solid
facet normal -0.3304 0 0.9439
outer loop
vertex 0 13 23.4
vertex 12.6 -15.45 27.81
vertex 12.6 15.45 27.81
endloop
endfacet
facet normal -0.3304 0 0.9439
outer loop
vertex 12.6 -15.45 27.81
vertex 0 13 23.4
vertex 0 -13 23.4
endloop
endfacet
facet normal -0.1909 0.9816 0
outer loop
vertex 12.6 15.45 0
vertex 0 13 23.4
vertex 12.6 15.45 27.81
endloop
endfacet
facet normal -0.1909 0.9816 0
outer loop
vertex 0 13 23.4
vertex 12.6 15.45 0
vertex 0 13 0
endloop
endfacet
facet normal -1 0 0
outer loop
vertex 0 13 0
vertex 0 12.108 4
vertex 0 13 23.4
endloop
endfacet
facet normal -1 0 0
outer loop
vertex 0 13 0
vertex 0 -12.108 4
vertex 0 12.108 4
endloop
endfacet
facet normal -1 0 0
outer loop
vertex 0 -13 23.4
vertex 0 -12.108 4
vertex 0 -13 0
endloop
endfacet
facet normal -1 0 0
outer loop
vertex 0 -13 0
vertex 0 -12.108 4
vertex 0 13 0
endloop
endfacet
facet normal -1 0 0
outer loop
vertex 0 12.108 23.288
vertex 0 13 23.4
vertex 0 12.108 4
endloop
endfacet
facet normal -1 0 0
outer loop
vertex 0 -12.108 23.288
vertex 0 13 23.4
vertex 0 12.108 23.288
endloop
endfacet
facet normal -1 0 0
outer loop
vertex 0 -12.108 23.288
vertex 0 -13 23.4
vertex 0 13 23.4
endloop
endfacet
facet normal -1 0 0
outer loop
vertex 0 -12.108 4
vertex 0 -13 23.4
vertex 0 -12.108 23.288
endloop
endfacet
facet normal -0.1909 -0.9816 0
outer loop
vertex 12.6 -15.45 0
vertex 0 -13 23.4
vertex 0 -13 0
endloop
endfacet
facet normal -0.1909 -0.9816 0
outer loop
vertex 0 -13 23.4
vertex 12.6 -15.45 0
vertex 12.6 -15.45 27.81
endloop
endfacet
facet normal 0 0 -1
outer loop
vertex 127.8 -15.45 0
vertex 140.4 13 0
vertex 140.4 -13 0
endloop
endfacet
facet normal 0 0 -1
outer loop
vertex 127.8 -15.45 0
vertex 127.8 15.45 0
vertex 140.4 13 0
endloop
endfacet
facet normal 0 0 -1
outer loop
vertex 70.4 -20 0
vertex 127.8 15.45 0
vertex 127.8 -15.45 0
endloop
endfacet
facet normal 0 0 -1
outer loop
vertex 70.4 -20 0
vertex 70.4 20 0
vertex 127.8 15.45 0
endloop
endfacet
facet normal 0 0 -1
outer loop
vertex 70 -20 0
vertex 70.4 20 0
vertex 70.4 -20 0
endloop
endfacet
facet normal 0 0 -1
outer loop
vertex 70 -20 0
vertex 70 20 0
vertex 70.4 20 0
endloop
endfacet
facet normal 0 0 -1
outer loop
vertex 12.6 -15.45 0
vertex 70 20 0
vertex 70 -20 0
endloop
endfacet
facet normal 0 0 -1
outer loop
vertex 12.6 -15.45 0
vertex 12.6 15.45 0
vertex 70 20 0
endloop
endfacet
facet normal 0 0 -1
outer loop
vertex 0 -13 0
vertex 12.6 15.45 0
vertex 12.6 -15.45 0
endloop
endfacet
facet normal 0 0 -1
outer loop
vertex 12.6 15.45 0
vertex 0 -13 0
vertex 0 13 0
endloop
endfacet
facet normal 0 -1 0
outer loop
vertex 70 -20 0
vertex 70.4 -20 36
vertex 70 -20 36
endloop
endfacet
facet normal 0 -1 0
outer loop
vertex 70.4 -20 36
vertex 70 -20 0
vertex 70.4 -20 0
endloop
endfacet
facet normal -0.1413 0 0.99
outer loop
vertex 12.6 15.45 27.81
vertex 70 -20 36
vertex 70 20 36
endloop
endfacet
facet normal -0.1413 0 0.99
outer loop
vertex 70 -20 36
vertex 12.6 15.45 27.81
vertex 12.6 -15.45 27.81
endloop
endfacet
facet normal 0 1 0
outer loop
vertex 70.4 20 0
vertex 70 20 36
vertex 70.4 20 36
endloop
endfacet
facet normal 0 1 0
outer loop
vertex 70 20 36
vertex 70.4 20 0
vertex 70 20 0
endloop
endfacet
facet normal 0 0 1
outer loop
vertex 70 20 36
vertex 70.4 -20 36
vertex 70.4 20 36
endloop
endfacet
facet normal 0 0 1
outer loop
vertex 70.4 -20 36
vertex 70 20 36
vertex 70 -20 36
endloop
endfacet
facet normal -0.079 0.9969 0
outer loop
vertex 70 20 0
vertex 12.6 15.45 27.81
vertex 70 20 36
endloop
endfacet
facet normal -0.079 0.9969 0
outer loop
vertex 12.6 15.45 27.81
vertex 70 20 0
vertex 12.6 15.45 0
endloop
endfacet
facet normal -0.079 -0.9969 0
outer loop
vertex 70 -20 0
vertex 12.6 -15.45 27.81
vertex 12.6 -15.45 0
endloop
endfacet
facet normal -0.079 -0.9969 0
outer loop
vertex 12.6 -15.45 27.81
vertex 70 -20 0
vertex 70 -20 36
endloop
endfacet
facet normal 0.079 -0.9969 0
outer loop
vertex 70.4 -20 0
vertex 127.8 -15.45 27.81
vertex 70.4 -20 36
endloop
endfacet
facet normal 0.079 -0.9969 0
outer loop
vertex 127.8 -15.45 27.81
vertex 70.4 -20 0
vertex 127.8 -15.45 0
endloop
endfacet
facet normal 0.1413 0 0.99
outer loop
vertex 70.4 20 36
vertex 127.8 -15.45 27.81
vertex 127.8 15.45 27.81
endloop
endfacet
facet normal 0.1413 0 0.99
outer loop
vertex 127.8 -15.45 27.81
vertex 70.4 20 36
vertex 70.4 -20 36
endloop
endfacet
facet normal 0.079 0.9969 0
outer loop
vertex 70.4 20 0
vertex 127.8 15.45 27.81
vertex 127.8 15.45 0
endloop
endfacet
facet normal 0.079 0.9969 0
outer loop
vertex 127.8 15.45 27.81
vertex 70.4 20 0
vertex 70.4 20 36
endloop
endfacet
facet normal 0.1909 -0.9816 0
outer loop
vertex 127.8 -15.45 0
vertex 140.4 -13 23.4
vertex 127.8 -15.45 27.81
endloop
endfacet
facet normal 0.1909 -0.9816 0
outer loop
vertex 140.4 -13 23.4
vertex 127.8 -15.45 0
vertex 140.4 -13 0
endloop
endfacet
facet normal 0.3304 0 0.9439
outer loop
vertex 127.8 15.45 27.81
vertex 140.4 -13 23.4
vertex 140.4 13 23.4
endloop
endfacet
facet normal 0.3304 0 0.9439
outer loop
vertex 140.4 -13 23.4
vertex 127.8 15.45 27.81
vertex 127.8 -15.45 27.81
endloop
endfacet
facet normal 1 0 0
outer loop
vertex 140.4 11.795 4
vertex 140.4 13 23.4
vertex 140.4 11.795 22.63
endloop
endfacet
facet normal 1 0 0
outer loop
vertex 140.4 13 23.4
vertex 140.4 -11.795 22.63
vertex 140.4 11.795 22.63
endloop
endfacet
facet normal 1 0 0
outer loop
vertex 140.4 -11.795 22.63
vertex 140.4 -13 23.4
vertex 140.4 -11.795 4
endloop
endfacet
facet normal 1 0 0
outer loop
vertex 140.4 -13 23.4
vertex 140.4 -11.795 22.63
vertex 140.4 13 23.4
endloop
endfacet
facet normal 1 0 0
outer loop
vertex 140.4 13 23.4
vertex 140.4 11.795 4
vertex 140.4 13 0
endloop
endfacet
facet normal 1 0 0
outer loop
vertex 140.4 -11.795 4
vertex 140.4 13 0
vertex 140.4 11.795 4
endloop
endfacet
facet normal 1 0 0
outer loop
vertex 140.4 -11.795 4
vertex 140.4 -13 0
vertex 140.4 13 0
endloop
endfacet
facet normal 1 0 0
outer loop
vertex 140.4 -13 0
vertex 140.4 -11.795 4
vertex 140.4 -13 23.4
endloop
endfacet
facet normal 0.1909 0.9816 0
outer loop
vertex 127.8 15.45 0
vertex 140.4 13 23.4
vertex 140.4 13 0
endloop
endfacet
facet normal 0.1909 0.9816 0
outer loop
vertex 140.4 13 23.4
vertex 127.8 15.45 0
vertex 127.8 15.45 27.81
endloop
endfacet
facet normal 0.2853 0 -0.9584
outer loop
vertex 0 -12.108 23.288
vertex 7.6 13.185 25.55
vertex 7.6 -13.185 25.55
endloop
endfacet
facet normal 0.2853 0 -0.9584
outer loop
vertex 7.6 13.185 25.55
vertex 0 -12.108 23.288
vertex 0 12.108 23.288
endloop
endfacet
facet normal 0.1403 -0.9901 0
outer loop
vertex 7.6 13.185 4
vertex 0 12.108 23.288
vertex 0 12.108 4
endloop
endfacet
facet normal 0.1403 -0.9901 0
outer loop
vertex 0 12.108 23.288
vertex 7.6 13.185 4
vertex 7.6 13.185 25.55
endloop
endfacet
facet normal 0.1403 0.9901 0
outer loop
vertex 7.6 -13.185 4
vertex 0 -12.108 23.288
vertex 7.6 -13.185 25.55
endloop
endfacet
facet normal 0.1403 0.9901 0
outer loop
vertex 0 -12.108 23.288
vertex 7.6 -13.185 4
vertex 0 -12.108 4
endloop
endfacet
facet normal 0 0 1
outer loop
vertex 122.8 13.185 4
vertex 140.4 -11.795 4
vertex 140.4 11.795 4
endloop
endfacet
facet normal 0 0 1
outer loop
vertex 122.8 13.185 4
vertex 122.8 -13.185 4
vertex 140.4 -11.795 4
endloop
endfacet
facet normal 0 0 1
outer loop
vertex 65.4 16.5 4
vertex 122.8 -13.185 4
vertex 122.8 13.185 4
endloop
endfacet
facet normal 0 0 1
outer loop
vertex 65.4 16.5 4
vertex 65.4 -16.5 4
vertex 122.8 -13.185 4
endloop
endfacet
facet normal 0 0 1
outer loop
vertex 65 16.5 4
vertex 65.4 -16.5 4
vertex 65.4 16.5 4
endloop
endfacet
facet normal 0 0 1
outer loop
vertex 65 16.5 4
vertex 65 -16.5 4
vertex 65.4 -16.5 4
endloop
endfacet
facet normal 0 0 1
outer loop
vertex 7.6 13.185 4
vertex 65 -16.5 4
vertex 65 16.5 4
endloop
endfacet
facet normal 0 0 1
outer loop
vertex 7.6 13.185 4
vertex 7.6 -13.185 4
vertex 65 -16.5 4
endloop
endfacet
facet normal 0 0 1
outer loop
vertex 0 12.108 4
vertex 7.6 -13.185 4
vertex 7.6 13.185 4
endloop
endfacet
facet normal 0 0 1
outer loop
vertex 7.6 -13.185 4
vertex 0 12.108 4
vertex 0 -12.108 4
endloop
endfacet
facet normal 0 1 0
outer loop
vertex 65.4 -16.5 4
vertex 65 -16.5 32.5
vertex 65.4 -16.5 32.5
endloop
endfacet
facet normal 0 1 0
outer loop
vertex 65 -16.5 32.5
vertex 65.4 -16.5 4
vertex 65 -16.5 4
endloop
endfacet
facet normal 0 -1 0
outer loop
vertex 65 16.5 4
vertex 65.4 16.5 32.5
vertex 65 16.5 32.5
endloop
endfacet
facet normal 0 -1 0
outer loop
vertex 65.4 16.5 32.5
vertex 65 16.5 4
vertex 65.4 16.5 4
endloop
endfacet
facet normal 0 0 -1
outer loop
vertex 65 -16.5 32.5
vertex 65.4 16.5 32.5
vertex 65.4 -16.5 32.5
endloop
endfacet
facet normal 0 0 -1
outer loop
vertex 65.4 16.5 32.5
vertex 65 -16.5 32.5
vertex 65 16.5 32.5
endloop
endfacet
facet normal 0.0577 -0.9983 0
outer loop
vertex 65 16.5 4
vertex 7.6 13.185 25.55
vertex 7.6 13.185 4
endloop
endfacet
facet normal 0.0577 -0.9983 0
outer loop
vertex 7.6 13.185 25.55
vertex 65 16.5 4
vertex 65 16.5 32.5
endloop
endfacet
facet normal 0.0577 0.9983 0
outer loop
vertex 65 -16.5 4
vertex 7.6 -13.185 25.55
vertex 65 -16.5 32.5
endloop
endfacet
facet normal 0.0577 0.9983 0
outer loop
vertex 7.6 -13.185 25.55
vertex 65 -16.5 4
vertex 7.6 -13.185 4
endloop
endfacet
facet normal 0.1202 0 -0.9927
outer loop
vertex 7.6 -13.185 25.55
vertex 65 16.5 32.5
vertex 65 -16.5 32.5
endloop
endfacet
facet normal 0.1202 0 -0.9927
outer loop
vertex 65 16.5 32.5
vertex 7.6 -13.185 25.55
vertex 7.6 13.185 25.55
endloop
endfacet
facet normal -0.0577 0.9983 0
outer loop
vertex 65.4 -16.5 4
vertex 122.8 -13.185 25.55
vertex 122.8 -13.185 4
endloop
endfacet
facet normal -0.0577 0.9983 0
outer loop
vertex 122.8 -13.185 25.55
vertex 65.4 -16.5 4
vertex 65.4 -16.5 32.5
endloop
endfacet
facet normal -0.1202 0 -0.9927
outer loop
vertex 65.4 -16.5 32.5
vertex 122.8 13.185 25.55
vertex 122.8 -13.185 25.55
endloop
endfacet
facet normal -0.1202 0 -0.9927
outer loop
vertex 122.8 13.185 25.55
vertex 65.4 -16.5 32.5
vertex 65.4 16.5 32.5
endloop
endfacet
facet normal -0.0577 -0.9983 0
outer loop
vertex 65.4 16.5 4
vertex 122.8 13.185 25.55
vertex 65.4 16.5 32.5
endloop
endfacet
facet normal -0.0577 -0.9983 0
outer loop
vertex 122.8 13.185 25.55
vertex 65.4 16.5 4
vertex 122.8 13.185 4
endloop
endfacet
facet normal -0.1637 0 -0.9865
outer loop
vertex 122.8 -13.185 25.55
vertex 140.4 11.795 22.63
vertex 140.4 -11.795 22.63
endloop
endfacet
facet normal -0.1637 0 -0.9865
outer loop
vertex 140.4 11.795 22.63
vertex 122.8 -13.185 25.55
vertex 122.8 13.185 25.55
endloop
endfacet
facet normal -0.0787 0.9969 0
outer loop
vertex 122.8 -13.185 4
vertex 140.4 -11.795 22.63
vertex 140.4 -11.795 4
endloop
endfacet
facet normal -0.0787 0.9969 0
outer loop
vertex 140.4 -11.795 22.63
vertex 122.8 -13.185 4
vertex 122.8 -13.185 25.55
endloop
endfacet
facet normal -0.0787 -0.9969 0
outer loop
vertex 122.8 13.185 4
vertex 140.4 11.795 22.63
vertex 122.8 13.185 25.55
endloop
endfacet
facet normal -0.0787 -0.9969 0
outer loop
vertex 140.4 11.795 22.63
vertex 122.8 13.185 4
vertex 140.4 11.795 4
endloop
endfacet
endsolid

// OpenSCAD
$fn = 32;

// ----------------------------------------------------------------------
// Faired channel: 140 x 40 x 36 mm, 3.5 mm walls, faired ends
// ----------------------------------------------------------------------

// --- parameters (mm) ---
length = 140;             // channel length
width = 40;               // channel width at mid length
height = 36;              // channel height at mid length
wall = 3.5;               // side wall thickness
floor_t = 4;              // floor thickness
end_w = 26;               // faired end width
end_h = 23.4;             // faired end height

difference() {
  union() {
    hull() {
      translate([0, -13, 0]) cube([0.4, 26, 23.4]);
      translate([12.6, -15.45, 0]) cube([0.4, 30.9, 27.81]);
    }
    hull() {
      translate([12.6, -15.45, 0]) cube([0.4, 30.9, 27.81]);
      translate([70, -20, 0]) cube([0.4, 40, 36]);
    }
    hull() {
      translate([70, -20, 0]) cube([0.4, 40, 36]);
      translate([127.4, -15.45, 0]) cube([0.4, 30.9, 27.81]);
    }
    hull() {
      translate([127.4, -15.45, 0]) cube([0.4, 30.9, 27.81]);
      translate([140, -13, 0]) cube([0.4, 26, 23.4]);
    }
  }
  /* cavity, 5 mm proud of both ends so the ports are cut clean */
  hull() {
    translate([-5, -11.4, 4]) cube([0.4, 22.8, 17.8]);
    translate([7.6, -13.185, 4]) cube([0.4, 26.37, 21.55]);
  }
  hull() {
    translate([7.6, -13.185, 4]) cube([0.4, 26.37, 21.55]);
    translate([65, -16.5, 4]) cube([0.4, 33, 28.5]);
  }
  hull() {
    translate([65, -16.5, 4]) cube([0.4, 33, 28.5]);
    translate([122.4, -13.185, 4]) cube([0.4, 26.37, 21.55]);
  }
  hull() {
    translate([122.4, -13.185, 4]) cube([0.4, 26.37, 21.55]);
    translate([145, -11.4, 4]) cube([0.4, 22.8, 17.8]);
  }
}
